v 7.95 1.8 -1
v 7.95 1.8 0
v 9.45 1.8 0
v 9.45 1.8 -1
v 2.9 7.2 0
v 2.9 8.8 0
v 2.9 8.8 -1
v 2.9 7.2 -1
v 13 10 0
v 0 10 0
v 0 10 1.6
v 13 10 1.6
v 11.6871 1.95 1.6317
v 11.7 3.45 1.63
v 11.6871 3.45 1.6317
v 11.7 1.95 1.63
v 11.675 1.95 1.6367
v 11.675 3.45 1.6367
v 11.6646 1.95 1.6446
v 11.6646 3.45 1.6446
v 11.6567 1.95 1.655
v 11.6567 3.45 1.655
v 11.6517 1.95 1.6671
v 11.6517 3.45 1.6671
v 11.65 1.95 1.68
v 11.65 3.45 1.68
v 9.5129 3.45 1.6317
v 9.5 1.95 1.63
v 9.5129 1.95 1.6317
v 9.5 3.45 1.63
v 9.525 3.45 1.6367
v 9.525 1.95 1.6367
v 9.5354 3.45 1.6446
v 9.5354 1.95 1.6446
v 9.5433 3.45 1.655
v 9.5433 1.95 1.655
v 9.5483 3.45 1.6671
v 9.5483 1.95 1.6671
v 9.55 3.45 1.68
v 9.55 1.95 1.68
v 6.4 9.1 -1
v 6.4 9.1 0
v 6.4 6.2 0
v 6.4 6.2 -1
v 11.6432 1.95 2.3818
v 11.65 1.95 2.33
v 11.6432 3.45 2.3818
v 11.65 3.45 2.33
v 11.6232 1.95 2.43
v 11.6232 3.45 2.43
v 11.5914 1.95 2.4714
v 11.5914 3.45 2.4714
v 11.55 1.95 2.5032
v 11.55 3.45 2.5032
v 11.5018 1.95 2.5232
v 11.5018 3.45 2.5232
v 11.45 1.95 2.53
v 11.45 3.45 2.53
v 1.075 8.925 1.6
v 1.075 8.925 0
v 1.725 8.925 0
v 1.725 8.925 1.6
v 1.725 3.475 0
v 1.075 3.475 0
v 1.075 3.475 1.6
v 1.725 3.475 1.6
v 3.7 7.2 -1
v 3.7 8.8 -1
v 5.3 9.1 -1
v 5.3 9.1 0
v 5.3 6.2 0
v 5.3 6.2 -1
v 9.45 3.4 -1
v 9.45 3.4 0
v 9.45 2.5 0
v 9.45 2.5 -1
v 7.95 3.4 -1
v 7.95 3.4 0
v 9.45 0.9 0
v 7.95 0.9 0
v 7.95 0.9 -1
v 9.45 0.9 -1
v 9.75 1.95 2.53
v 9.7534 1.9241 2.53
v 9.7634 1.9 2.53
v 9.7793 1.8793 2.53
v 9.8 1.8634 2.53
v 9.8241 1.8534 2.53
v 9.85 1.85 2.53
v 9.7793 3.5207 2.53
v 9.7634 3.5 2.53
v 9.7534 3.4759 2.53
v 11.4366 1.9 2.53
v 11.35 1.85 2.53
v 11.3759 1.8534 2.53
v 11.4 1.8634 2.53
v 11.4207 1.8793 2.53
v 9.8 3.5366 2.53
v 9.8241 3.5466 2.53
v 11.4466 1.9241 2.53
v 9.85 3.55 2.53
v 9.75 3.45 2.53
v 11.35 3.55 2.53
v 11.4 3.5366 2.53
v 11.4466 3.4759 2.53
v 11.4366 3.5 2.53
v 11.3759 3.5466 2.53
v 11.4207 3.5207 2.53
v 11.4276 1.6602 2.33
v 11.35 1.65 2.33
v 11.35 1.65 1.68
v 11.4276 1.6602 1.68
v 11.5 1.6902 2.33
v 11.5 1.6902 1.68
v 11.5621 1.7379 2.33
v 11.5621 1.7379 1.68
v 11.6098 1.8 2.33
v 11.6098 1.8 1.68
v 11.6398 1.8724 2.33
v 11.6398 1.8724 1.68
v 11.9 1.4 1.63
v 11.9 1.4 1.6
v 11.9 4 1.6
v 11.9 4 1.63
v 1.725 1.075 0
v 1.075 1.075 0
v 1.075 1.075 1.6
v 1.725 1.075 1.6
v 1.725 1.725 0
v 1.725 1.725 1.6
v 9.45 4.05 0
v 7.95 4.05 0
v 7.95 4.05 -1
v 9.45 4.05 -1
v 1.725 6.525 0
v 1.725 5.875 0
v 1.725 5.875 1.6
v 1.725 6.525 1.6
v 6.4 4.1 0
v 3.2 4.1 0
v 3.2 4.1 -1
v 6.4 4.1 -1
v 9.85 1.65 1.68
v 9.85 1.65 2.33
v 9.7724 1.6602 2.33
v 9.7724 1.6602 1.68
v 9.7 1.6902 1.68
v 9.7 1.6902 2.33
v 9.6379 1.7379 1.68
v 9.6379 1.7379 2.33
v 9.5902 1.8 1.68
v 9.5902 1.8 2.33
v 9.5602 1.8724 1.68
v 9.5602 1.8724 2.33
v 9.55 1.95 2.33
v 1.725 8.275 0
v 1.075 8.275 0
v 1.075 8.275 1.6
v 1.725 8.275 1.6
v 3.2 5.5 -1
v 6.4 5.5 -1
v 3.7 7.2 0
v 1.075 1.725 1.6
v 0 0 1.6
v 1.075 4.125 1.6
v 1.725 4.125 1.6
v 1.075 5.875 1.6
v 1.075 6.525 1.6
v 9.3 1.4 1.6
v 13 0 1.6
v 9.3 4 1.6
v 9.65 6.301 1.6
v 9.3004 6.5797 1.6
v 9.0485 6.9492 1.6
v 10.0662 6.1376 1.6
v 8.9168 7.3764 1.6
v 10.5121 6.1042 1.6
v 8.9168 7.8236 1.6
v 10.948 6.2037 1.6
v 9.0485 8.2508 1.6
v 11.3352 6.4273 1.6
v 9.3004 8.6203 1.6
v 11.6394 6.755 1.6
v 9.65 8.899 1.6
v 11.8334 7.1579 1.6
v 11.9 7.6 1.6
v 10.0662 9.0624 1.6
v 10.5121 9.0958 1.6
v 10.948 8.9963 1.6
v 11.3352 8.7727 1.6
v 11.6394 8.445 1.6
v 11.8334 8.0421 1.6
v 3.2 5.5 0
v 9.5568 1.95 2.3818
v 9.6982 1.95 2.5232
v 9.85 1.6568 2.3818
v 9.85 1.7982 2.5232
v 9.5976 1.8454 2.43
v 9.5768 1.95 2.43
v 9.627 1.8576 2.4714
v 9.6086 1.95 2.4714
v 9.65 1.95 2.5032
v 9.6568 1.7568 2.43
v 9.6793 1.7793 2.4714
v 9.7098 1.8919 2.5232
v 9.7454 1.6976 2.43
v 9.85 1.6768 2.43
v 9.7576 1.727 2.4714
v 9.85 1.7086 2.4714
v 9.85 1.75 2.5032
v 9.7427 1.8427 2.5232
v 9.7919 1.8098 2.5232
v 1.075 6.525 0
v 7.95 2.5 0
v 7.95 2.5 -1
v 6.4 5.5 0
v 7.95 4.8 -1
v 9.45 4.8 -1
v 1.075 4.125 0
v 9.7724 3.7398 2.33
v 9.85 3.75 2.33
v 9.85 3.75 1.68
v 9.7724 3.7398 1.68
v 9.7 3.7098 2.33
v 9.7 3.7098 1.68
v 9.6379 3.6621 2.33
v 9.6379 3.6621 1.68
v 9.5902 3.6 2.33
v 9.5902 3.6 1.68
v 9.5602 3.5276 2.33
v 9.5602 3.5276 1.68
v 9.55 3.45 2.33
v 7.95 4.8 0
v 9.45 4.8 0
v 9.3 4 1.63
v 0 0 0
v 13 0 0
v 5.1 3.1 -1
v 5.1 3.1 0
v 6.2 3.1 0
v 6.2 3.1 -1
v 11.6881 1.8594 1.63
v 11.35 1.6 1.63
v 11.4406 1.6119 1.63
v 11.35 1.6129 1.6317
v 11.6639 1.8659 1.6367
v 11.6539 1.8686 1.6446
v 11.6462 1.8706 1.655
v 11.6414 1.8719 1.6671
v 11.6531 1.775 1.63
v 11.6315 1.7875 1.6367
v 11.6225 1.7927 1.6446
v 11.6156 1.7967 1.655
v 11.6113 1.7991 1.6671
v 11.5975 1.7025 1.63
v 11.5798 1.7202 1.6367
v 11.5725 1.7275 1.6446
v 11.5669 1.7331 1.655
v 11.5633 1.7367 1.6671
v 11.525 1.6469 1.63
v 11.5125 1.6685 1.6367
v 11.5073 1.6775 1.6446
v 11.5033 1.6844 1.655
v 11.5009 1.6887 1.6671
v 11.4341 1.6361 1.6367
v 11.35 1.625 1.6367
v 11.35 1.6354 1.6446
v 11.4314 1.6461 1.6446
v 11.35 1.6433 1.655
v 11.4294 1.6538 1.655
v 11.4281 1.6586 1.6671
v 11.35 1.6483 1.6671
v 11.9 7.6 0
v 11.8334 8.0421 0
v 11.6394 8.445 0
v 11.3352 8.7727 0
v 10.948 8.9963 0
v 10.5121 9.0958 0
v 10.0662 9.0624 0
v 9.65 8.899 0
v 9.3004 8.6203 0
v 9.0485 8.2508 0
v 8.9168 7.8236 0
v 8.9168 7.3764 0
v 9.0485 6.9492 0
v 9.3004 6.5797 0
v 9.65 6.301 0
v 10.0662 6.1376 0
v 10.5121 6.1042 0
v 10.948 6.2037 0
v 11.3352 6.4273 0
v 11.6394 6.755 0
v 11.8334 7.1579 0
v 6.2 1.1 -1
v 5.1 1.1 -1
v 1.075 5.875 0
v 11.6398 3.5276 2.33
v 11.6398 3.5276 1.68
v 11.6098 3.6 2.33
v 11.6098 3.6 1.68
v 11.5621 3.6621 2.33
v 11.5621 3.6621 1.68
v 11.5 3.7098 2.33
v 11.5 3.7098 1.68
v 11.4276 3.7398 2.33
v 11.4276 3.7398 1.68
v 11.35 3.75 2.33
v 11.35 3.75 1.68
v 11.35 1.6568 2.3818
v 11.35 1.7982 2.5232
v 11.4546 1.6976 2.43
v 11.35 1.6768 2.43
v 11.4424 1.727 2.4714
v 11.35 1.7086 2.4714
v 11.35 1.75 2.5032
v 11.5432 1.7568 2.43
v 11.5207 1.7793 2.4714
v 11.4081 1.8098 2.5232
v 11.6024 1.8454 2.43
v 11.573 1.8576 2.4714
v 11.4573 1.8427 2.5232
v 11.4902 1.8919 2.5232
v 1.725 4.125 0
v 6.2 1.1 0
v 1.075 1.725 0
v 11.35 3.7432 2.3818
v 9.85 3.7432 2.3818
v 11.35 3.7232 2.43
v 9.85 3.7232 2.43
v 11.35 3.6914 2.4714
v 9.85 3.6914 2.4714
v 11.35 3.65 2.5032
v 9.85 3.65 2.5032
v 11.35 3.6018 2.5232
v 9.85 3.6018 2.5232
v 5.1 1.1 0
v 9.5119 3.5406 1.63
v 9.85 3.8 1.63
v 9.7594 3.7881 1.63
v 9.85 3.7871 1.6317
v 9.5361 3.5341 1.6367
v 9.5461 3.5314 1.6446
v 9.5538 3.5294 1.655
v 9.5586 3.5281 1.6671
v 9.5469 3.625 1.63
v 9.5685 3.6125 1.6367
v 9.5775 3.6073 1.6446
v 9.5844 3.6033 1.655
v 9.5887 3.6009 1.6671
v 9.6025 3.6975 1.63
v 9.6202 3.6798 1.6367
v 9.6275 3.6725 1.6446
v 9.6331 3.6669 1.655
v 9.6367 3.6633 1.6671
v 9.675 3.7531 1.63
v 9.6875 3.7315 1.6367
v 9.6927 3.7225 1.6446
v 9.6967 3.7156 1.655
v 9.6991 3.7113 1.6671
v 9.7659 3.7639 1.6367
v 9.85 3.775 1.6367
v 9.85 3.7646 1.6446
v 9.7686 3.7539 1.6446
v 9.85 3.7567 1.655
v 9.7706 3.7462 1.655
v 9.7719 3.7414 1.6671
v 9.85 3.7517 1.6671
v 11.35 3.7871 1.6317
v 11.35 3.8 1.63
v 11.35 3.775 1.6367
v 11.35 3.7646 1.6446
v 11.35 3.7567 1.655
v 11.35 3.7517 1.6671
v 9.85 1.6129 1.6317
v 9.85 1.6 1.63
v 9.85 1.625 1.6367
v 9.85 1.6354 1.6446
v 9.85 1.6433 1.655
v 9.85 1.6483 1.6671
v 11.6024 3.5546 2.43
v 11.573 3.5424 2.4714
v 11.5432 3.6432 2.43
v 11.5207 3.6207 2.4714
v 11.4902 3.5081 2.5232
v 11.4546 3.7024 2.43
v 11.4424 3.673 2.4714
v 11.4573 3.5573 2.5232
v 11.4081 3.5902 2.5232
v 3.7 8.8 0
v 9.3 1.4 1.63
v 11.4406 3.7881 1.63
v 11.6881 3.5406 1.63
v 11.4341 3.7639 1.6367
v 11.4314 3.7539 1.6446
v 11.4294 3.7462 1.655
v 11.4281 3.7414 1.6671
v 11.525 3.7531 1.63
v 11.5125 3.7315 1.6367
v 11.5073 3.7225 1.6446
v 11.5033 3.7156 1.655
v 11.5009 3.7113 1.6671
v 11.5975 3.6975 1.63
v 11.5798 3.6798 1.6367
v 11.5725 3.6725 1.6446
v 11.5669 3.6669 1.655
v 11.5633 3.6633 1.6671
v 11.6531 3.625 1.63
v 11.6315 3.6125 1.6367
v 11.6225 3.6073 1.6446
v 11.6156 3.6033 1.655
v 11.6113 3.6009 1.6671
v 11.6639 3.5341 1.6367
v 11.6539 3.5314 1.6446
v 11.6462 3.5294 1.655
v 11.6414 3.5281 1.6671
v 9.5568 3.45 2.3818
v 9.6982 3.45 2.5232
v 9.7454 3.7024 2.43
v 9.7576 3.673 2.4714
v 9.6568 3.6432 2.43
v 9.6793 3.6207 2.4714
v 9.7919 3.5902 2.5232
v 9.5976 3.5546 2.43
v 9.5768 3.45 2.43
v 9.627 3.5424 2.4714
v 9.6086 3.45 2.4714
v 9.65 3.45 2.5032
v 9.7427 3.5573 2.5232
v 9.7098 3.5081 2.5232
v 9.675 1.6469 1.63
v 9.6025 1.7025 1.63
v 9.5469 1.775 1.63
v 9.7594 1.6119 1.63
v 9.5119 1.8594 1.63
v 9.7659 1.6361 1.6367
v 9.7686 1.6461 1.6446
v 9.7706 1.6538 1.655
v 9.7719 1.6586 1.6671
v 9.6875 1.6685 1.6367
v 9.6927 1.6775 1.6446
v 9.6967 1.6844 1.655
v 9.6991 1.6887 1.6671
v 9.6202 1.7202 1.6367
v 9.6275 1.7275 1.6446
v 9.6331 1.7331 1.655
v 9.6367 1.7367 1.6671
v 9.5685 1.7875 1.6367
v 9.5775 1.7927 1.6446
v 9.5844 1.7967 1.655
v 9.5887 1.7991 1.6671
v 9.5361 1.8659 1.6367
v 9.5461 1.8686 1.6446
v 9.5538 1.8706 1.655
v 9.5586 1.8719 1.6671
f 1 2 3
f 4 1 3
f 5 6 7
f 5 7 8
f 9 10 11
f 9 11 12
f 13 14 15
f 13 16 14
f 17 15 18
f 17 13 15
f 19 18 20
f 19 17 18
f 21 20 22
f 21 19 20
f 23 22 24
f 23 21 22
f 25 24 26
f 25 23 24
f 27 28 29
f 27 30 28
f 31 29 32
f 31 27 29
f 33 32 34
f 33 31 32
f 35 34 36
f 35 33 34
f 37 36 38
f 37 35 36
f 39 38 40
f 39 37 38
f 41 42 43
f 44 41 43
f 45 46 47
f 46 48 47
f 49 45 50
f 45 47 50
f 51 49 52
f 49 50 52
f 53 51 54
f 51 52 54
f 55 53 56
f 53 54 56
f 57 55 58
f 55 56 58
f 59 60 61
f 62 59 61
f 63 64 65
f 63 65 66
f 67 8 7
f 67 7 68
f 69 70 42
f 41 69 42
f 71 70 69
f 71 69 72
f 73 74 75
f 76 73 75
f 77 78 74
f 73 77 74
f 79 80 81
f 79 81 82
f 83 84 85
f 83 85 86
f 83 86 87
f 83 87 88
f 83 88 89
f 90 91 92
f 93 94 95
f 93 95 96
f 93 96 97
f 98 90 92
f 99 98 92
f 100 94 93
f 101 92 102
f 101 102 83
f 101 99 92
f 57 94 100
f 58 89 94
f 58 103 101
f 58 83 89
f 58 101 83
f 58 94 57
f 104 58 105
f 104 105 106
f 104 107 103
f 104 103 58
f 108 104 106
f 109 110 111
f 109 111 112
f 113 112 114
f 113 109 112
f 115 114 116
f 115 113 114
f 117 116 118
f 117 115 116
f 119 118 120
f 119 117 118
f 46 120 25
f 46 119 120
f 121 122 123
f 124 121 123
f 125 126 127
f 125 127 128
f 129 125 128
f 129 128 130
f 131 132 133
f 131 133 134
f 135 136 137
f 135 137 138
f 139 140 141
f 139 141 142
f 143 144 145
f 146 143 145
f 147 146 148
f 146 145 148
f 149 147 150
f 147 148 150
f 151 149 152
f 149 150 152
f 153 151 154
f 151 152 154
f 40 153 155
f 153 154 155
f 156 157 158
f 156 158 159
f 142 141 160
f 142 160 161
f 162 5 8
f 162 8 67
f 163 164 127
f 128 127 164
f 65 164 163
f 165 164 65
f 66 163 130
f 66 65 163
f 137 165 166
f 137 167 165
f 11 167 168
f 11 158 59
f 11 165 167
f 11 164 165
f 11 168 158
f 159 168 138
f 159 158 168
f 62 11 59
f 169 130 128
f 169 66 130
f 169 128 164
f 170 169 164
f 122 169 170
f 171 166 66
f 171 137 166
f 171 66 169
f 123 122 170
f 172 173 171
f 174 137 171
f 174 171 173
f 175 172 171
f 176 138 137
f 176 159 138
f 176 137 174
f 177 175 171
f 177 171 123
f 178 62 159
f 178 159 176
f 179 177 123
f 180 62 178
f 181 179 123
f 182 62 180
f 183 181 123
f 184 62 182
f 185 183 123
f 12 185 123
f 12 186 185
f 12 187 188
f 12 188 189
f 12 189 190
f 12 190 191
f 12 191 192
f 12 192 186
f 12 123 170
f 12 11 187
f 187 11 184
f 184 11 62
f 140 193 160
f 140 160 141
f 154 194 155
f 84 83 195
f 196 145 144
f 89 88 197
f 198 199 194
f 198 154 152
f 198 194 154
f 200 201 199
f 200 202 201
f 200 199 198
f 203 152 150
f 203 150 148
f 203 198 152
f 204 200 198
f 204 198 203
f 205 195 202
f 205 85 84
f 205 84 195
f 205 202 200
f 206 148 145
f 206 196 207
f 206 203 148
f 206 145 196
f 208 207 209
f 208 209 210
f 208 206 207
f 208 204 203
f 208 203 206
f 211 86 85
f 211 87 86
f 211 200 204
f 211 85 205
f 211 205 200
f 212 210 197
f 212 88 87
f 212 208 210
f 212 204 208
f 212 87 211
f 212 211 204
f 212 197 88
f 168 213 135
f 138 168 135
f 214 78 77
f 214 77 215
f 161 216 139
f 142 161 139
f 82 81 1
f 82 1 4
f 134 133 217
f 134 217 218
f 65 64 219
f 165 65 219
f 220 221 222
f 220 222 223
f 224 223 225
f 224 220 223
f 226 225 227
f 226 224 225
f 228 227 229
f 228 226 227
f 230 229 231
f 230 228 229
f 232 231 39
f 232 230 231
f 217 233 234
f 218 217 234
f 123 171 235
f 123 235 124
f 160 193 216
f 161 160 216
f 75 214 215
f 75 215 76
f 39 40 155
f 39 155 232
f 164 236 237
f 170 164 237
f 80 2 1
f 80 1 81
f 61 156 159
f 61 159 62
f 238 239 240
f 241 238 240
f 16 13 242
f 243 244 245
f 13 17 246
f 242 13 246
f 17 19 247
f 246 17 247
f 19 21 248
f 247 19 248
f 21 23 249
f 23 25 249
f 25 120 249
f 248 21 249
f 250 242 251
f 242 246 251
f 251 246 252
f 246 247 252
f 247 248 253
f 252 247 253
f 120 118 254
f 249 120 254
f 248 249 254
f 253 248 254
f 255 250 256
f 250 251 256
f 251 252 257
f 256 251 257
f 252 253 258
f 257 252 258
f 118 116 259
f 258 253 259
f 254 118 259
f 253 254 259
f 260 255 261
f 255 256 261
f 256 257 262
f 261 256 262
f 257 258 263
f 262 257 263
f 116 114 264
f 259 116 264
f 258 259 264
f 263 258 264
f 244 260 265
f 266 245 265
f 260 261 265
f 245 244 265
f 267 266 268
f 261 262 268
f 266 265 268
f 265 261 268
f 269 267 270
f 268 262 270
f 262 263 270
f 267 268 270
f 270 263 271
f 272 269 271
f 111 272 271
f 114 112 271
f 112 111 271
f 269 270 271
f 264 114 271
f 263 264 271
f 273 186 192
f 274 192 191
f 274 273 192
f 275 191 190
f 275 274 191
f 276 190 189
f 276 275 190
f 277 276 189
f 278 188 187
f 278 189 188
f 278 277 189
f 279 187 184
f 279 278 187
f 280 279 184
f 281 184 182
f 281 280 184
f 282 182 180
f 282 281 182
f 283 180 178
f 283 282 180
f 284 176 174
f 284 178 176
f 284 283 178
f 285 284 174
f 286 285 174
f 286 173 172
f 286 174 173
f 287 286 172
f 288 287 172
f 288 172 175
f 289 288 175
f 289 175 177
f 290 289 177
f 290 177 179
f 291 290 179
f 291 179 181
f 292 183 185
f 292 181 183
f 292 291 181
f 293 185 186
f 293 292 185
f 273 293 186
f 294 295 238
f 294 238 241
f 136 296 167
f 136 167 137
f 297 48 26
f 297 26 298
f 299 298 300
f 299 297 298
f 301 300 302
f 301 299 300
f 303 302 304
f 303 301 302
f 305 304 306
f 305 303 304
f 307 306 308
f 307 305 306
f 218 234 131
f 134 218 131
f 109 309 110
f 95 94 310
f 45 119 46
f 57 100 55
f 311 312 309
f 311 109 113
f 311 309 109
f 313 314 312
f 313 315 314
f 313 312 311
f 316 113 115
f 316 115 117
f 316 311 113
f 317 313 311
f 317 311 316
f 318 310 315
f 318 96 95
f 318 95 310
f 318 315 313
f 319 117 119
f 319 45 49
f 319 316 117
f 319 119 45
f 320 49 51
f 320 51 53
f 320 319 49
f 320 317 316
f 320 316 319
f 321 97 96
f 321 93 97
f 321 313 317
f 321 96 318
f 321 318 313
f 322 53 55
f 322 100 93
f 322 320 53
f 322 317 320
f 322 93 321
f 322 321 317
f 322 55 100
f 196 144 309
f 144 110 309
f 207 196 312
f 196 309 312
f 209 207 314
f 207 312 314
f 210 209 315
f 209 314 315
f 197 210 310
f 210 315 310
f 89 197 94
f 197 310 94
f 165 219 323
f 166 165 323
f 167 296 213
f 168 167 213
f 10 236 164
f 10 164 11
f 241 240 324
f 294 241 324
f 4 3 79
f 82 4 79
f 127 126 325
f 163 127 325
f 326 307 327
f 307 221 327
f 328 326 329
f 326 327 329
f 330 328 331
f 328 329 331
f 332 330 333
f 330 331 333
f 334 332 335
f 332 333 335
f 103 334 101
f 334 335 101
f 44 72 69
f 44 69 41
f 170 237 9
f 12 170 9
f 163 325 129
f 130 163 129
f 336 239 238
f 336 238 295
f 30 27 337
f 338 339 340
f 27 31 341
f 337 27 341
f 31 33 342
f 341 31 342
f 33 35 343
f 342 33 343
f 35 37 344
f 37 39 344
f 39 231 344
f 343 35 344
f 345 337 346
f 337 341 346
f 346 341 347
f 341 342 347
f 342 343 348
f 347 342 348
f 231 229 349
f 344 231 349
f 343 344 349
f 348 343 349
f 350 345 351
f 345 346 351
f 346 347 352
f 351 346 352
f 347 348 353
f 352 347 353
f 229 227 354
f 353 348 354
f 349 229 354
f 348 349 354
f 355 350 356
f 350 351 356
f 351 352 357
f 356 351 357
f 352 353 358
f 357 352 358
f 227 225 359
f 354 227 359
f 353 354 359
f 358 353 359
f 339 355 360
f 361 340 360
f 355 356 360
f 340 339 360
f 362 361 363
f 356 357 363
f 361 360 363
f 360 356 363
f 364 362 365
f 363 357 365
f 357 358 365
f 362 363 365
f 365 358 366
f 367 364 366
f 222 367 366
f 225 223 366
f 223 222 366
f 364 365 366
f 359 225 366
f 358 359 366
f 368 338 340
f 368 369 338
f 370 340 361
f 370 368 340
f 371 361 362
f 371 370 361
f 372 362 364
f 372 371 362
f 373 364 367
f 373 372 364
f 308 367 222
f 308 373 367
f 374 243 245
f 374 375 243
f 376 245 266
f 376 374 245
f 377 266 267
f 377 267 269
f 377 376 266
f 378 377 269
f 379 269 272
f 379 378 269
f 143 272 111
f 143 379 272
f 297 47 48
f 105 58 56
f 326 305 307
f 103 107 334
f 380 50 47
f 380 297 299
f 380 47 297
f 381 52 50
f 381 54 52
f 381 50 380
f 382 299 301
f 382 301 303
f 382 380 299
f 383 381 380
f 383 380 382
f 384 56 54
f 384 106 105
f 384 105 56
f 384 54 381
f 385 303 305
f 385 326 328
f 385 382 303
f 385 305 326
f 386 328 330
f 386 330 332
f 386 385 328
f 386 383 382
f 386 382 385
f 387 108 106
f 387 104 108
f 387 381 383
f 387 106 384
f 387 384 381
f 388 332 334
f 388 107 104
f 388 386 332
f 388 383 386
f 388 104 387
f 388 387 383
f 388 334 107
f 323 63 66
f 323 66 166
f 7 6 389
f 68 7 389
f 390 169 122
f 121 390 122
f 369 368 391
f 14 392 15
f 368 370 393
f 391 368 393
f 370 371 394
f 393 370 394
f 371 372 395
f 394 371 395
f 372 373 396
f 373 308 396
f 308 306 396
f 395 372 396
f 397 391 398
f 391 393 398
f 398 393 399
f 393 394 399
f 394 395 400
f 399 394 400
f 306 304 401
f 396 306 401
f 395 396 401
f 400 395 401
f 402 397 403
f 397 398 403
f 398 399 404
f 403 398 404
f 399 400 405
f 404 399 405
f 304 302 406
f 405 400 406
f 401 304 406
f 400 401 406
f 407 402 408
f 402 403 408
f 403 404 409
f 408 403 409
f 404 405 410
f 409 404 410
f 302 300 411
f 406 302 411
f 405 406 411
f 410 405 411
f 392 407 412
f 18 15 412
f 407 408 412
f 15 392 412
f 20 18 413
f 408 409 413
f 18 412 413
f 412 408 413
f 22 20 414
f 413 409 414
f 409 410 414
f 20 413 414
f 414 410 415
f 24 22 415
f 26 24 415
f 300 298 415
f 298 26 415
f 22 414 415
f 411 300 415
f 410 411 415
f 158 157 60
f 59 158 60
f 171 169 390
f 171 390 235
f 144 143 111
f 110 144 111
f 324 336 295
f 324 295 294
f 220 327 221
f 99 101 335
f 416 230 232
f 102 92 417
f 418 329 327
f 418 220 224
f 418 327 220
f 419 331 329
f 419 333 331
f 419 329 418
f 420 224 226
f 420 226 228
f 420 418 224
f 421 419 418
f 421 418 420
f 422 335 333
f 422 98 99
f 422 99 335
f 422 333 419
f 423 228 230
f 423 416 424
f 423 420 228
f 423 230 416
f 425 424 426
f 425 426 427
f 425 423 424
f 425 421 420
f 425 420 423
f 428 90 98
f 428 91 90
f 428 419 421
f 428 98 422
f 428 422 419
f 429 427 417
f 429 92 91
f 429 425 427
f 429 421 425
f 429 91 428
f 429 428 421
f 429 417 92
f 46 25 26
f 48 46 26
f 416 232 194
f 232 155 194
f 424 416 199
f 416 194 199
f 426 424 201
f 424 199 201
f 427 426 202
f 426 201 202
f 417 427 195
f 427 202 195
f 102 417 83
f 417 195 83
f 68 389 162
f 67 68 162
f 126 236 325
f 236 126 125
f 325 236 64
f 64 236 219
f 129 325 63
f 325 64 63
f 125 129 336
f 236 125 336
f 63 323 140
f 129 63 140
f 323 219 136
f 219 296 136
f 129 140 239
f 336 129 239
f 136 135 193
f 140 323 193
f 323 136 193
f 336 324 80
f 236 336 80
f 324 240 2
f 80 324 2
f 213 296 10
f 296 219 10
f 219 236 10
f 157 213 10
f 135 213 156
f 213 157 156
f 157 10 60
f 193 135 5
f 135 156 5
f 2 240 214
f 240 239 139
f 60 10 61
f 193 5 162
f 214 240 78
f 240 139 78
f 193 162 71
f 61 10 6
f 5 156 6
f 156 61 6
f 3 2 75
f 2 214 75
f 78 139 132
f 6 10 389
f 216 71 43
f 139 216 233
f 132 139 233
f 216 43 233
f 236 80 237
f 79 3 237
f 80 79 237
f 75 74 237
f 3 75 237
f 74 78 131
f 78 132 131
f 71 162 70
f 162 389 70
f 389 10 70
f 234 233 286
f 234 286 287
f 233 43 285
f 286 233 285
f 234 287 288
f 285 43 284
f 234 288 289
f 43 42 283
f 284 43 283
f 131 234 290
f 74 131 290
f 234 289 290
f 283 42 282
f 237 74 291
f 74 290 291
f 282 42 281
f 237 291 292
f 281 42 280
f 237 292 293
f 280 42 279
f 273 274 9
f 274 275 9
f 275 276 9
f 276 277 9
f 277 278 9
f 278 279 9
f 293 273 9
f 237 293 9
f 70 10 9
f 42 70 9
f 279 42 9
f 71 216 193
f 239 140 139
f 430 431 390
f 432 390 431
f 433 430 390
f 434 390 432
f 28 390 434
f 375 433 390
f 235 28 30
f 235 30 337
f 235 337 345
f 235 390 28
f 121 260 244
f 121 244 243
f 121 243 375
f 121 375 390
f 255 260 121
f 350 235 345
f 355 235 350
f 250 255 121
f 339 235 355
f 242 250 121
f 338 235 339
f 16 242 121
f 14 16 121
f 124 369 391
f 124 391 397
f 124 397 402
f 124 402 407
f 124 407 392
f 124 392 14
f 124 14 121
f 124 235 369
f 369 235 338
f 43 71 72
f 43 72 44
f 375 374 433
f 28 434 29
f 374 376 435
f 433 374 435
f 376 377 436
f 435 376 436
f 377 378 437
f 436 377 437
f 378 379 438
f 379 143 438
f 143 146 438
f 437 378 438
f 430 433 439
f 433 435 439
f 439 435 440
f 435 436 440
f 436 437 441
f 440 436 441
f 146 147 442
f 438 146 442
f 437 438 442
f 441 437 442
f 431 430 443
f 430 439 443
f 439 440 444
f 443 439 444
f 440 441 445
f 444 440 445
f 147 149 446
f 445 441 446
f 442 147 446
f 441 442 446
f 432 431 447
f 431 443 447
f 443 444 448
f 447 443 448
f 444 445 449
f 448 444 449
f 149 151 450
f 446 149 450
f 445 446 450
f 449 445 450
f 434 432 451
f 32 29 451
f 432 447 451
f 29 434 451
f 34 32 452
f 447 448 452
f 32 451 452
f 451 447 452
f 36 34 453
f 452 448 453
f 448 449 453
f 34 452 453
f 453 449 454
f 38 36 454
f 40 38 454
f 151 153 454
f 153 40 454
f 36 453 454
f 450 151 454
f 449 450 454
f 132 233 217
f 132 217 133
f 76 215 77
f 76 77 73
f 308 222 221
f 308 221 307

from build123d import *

# Parameters (mm, degrees)
SKETCH_W      = 13
SKETCH_H      = 10
PAD_DEPTH     = 1.6
SKETCH001_R   = 1.5
SKETCH001_W   = 0.65
SKETCH001_H   = 0.65
POCKET_DEPTH  = 5
SKETCH002_W   = 2.6
SKETCH002_H   = 2.6
PAD001_DEPTH  = 0.03
SKETCH003_W   = 2.1
SKETCH003_H   = 2.1
PAD002_DEPTH  = 0.9
FILLET_R      = 0.3
FILLET001_R   = 0.05
FILLET002_R   = 0.2
SKETCH004_W   = 1.1
SKETCH004_H   = 2
SKETCH004_W_2 = 1.5
SKETCH004_H_2 = 0.9
SKETCH004_H_3 = 0.75
SKETCH004_H_4 = 2.9
SKETCH004_W_3 = 3.2
SKETCH004_H_5 = 1.4
SKETCH004_W_4 = 0.8
SKETCH004_H_6 = 1.6
PAD003_DEPTH  = 1


with BuildPart() as part:
    # Sketch (on XY_Plane of Origin) → Pad (new body)
    with BuildSketch(Plane.XY):
        with Locations((6.5, 5)):
            Rectangle(SKETCH_W, SKETCH_H)
    extrude(amount=PAD_DEPTH)

    # Sketch001 (on XY_Plane of Origin) → Pocket (cut)
    with BuildSketch(Plane.XY):
        with Locations((10.4, 7.6)):
            Circle(SKETCH001_R)
        with Locations((1.4, 8.6)):
            Rectangle(SKETCH001_W, SKETCH001_H)
        with Locations((1.4, 6.2)):
            Rectangle(SKETCH001_W, SKETCH001_H)
        with Locations((1.4, 3.8)):
            Rectangle(SKETCH001_W, SKETCH001_H)
        with Locations((1.4, 1.4)):
            Rectangle(SKETCH001_W, SKETCH001_H)
    extrude(amount=POCKET_DEPTH, mode=Mode.SUBTRACT)

    # Sketch002 (on Face5 of Pocket) → Pad001 (join)
    with BuildSketch(Plane.XY.offset(1.6)):
        with Locations((10.6, 2.7)):
            Rectangle(SKETCH002_W, SKETCH002_H)
    extrude(amount=PAD001_DEPTH)

    # Sketch003 (on Face28 of Pad001) → Pad002 (join)
    with BuildSketch(Plane.XY.offset(1.63)):
        with Locations((10.6, 2.7)):
            Rectangle(SKETCH003_W, SKETCH003_H)
    extrude(amount=PAD002_DEPTH)

    # Fillet
    fillet_edges = [part.edges().sort_by_distance(p)[0] for p in [
        (9.55, 1.65, 2.08),
        (9.55, 3.75, 2.08),
        (11.65, 1.65, 2.08),
        (11.65, 3.75, 2.08),
    ]]
    fillet(fillet_edges, radius=FILLET_R)

    # Fillet001
    fillet001_edges = [part.edges().sort_by_distance(p)[0] for p in [
        (9.637868, 1.737868, 1.63),
    ]]
    fillet(fillet001_edges, radius=FILLET001_R)

    # Fillet002
    fillet002_edges = [part.edges().sort_by_distance(p)[0] for p in [
        (10.6, 1.65, 2.53),
    ]]
    fillet(fillet002_edges, radius=FILLET002_R)

    # Sketch004 (on Face53 of Fillet002) → Pad003 (join)
    with BuildSketch(Plane(origin=(0, 0, 0), x_dir=(1, 0, 0), z_dir=(0, 0, -1))):
        with Locations((5.65, -2.1)):
            Rectangle(SKETCH004_W, SKETCH004_H)
        with Locations((8.7, -1.35)):
            Rectangle(SKETCH004_W_2, SKETCH004_H_2)
        with Locations((8.7, -2.95)):
            Rectangle(SKETCH004_W_2, SKETCH004_H_2)
        with Locations((8.7, -4.425)):
            Rectangle(SKETCH004_W_2, SKETCH004_H_3)
        with Locations((5.85, -7.65)):
            Rectangle(SKETCH004_W, SKETCH004_H_4)
        with Locations((4.8, -4.8)):
            Rectangle(SKETCH004_W_3, SKETCH004_H_5)
        with Locations((3.3, -8)):
            Rectangle(SKETCH004_W_4, SKETCH004_H_6)
    extrude(amount=PAD003_DEPTH)


solid = part.part
